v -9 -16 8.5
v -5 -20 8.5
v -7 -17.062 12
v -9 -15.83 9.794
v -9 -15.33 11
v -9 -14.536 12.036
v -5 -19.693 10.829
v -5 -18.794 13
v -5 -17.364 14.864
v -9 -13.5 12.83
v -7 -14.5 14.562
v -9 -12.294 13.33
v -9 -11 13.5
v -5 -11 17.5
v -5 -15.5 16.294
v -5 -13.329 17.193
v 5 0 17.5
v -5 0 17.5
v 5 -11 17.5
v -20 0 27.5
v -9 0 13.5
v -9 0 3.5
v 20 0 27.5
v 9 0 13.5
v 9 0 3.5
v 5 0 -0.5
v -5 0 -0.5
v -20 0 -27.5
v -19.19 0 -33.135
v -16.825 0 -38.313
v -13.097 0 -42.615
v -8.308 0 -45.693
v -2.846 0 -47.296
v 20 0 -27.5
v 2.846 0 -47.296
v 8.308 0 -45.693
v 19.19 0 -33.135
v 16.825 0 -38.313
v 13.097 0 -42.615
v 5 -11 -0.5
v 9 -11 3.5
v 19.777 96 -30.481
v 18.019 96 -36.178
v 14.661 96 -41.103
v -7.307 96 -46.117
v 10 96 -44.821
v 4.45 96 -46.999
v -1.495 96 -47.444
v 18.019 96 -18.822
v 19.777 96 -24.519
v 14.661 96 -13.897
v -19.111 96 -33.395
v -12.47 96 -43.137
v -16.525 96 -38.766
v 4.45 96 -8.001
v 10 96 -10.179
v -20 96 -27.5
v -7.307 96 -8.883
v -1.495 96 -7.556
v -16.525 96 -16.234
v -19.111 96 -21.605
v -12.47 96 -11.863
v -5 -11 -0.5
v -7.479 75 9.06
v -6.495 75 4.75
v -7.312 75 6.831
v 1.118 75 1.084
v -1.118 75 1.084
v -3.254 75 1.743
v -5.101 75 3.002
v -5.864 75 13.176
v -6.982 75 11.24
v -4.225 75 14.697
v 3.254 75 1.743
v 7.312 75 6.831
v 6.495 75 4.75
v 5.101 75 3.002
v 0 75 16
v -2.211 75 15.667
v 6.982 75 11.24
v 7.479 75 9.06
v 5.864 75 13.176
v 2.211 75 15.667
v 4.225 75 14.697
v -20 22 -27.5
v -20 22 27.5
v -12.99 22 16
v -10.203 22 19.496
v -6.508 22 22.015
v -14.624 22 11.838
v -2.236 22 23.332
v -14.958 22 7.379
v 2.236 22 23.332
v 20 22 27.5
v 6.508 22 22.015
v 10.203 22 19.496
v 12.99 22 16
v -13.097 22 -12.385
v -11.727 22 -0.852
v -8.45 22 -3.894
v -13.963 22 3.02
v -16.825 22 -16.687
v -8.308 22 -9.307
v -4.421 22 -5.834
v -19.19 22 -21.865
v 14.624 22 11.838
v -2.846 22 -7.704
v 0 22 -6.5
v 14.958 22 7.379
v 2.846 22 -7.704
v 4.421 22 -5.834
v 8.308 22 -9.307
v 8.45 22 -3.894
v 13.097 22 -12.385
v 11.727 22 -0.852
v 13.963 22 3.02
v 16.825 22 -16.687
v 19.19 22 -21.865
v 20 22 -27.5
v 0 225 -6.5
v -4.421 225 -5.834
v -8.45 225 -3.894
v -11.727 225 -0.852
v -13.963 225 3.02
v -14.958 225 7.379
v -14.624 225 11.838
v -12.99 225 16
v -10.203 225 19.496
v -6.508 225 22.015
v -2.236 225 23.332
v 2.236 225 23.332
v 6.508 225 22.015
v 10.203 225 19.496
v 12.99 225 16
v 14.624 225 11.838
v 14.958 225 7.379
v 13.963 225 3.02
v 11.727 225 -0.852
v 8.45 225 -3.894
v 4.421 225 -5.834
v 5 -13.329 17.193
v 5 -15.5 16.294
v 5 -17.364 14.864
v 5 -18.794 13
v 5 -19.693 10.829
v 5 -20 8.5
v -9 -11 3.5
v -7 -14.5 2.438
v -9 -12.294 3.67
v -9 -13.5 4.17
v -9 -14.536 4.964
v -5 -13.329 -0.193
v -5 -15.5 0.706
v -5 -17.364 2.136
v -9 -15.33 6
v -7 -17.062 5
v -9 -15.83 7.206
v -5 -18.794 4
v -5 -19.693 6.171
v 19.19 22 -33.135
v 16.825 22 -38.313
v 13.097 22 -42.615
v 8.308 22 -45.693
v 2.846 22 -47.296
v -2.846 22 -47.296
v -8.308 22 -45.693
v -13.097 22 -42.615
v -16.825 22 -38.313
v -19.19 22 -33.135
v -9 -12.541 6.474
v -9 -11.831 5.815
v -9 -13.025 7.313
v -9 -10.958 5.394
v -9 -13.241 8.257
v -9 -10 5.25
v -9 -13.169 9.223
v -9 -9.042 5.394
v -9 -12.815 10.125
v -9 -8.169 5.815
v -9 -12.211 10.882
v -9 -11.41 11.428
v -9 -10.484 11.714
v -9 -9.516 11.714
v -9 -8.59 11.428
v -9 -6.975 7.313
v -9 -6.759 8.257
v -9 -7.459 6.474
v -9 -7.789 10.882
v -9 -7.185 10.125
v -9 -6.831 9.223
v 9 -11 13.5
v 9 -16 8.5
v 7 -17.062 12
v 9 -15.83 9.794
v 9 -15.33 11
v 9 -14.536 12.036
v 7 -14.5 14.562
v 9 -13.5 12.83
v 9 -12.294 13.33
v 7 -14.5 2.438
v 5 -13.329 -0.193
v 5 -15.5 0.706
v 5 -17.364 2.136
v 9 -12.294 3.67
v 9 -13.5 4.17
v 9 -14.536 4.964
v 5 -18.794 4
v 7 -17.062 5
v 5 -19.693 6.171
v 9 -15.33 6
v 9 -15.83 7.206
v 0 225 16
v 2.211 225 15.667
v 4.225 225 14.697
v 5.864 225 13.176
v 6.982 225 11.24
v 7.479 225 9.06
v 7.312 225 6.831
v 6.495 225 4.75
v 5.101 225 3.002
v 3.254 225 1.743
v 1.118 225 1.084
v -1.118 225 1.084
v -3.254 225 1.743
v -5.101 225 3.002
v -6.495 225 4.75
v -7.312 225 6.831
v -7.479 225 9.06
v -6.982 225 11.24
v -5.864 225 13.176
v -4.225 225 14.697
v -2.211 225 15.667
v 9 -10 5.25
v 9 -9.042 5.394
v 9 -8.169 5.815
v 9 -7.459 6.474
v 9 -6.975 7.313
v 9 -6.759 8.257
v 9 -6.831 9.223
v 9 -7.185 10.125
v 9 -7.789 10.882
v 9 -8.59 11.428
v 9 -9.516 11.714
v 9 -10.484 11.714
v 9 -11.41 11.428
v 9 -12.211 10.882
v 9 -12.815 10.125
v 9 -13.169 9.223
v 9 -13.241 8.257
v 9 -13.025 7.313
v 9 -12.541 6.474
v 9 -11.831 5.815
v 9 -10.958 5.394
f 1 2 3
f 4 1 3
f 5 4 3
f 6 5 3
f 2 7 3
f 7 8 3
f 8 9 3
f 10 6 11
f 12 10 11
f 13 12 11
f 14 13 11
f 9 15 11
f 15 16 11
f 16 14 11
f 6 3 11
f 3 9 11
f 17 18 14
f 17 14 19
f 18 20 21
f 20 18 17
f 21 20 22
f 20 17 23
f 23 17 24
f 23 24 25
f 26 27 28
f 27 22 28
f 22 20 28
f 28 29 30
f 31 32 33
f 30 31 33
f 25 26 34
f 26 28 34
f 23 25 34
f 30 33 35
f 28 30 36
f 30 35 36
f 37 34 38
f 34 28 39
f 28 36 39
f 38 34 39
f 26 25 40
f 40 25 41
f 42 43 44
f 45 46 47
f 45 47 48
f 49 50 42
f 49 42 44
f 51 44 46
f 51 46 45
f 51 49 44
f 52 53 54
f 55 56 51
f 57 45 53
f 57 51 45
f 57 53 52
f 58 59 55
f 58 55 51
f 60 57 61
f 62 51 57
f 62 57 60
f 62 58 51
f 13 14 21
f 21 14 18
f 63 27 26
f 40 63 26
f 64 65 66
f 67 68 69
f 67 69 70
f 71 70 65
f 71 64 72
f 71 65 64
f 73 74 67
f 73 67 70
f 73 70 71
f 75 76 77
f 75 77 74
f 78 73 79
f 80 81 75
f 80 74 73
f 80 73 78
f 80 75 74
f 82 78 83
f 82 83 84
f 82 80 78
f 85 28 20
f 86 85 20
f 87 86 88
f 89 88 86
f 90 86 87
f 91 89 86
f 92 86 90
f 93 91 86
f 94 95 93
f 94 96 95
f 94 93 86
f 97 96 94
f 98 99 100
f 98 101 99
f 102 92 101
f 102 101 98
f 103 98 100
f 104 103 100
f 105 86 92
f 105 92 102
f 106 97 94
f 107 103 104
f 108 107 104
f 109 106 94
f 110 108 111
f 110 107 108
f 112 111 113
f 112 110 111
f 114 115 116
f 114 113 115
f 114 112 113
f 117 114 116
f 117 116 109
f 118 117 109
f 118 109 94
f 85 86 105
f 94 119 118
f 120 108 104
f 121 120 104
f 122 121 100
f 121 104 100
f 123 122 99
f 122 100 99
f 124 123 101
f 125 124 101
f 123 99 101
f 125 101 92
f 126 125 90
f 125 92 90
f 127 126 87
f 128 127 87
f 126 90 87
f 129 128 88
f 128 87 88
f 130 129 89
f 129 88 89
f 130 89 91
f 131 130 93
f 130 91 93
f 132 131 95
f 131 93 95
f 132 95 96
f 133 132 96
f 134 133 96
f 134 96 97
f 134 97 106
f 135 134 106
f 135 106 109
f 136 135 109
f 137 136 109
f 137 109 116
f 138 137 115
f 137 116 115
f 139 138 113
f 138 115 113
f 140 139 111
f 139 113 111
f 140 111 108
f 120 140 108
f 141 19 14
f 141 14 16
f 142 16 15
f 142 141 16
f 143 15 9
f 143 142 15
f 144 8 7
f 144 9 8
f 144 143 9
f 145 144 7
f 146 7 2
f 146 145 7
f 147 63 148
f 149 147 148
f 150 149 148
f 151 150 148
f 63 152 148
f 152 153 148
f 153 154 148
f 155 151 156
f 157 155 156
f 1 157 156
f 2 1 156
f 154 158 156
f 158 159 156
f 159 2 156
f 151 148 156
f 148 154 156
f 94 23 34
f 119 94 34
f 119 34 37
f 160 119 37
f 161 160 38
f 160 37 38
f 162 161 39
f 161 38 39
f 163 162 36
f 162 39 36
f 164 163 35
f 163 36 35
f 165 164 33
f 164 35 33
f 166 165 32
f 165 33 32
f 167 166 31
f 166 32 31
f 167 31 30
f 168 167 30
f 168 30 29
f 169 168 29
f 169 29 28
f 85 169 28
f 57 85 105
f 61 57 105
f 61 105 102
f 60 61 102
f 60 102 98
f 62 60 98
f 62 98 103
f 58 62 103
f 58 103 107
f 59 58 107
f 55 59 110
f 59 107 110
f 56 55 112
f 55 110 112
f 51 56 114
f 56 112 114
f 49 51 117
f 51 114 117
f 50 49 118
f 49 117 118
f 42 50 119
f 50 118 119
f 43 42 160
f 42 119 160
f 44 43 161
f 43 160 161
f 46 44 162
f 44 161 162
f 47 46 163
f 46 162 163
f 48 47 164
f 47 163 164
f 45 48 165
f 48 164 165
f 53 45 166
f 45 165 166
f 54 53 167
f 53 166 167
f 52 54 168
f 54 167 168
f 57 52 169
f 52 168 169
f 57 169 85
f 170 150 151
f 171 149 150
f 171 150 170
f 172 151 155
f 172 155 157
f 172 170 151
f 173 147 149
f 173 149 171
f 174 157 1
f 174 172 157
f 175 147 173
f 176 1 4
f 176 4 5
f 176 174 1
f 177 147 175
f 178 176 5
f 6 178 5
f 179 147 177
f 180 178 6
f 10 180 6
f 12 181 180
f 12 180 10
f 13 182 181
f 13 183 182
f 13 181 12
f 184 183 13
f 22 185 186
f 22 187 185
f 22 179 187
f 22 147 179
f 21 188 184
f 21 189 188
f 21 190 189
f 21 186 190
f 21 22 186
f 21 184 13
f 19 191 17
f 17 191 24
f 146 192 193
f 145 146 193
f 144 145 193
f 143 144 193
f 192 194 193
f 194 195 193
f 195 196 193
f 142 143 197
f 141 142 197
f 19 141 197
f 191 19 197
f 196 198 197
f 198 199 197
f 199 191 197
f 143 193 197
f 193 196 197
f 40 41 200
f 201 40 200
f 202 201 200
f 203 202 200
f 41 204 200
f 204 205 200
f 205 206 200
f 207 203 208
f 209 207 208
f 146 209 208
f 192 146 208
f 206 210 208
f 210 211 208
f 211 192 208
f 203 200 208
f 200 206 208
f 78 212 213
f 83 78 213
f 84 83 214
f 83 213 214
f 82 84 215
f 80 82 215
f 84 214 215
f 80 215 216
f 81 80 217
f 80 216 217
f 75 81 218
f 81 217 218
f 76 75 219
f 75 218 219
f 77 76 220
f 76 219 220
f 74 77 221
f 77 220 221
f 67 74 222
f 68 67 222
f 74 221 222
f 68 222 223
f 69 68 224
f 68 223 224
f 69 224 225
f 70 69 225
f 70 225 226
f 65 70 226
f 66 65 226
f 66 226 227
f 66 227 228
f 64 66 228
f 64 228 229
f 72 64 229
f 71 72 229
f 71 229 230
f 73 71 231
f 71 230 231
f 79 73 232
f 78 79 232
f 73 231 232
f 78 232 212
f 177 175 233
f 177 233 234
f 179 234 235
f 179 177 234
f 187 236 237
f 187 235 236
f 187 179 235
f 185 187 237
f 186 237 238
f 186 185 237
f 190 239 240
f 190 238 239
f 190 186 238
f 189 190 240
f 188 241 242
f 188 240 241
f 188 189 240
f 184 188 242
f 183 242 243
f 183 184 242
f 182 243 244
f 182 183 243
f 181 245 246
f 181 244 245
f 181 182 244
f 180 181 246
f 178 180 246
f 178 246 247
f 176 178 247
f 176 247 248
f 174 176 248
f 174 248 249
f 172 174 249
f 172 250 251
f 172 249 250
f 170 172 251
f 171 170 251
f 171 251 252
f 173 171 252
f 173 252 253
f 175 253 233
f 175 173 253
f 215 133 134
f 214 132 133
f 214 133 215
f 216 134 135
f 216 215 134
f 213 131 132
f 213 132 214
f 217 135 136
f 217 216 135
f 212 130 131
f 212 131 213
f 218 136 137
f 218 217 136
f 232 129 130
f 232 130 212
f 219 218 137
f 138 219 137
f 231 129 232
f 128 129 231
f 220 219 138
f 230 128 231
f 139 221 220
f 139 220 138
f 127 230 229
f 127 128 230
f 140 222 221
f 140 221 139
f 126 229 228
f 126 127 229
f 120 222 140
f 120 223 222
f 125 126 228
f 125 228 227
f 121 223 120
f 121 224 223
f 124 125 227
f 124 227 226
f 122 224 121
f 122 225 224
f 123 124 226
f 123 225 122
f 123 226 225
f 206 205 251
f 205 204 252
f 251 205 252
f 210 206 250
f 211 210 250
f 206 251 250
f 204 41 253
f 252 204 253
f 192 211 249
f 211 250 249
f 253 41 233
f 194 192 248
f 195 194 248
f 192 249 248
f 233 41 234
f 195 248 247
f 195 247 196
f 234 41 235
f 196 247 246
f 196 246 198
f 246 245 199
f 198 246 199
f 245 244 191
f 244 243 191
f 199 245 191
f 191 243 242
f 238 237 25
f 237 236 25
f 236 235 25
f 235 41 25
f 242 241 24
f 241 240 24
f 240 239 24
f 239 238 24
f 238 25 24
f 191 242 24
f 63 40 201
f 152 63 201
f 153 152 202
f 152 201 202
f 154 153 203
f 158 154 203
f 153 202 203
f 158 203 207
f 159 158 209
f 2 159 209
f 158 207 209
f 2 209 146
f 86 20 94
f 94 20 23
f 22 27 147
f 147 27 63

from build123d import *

# Parameters (mm, degrees)
EXTRUDE_1_DEPTH          = 22
SKETCH_2_R               = 20
EXTRUDE_2_DEPTH          = 74
SKETCH_3_R               = 15
EXTRUDE_3_DEPTH          = 203
SKETCH_4_R               = 7.5
CUT_EXTRUDE_1_DEPTH      = 150
SKETCH_5_W               = 18
SKETCH_5_H               = 18
EXTRUDE_4_DEPTH          = 20
CUT_EXTRUDE_2_DEPTH      = 232.780607472
CUT_EXTRUDE_2_DEPTH_BACK = 232.780607472
CUT_EXTRUDE_3_DEPTH      = 232.780607472
CUT_EXTRUDE_3_DEPTH_BACK = 232.780607472
CHAMFER_1_SIZE           = 4
CHAMFER_2_SIZE           = 4
CUT_EXTRUDE_4_DEPTH      = 232.780607472
CUT_EXTRUDE_4_DEPTH_BACK = 232.780607472
SKETCH_8_R               = 3.25


with BuildPart() as part:
    # 草图1 → 凸台-拉伸1 (new body)
    with BuildSketch(Plane(origin=(0, 0, 0), x_dir=(1, 0, 0), z_dir=(0, 1, 0))):
        with BuildLine():
            Line((-20, -27.5), (20, -27.5))
            Line((20, -27.5), (20, 27.5))
            ThreePointArc((20, 27.5), (0, 47.5), (-20, 27.5))
            Line((-20, 27.5), (-20, -27.5))
        make_face()
    extrude(amount=EXTRUDE_1_DEPTH)

    # 草图2 → 凸台-拉伸2 (add)
    with BuildSketch(Plane(origin=(0, 22, 0), x_dir=(1, 0, 0), z_dir=(0, 1, 0))):
        with Locations(Location((0, 27.5, 0), (0, 0, 180))):
            Circle(SKETCH_2_R)
    extrude(amount=EXTRUDE_2_DEPTH)

    # 草图3 → 凸台-拉伸3 (add)
    with BuildSketch(Plane(origin=(0, 22, 0), x_dir=(1, 0, 0), z_dir=(0, 1, 0))):
        with Locations(Location((0, -8.5, 0), (0, 0, 90))):
            Circle(SKETCH_3_R)
    extrude(amount=EXTRUDE_3_DEPTH)

    # 草图4 → 切除-拉伸1 (cut)
    with BuildSketch(Plane(origin=(0, 225, 0), x_dir=(1, 0, 0), z_dir=(0, 1, 0))):
        with Locations(Location((0, -8.5, 0), (0, 0, 270))):
            Circle(SKETCH_4_R)
    extrude(amount=-CUT_EXTRUDE_1_DEPTH, mode=Mode.SUBTRACT)

    # 草图5 → 凸台-拉伸4 (add)
    with BuildSketch(Plane.XZ):
        with Locations((0, 8.5)):
            Rectangle(SKETCH_5_W, SKETCH_5_H)
    extrude(amount=EXTRUDE_4_DEPTH)

    # 草图6 → 切除-拉伸2 (cut, two sides: drawn at the far end of the back side and taken through both)
    with BuildSketch(Plane.ZY.offset(9).offset(-CUT_EXTRUDE_2_DEPTH_BACK)):
        with BuildLine():
            Line((8.5, -20), (-0.5, -20))
            Line((-0.5, -20), (-0.5, -11))
            ThreePointArc((-0.5, -11), (2.136038969, -17.363961031), (8.5, -20))
        make_face()
    extrude(amount=CUT_EXTRUDE_2_DEPTH + CUT_EXTRUDE_2_DEPTH_BACK, mode=Mode.SUBTRACT)

    # 草图7 → 切除-拉伸3 (cut, two sides: drawn at the far end of the back side and taken through both)
    with BuildSketch(Plane.ZY.offset(9).offset(-CUT_EXTRUDE_3_DEPTH_BACK)):
        with BuildLine():
            Line((8.5, -20), (17.5, -20))
            Line((17.5, -20), (17.5, -11))
            ThreePointArc((17.5, -11), (14.863961031, -17.363961031), (8.5, -20))
        make_face()
    extrude(amount=CUT_EXTRUDE_3_DEPTH + CUT_EXTRUDE_3_DEPTH_BACK, mode=Mode.SUBTRACT)

    # 倒角1
    chamfer_1_edges = [part.edges().sort_by_distance(p)[0] for p in [
        (-9, -5.5, -0.5),
        (-9, -20, 8.5),
        (-9, -5.5, 17.5),
    ]]
    chamfer(chamfer_1_edges, length=CHAMFER_1_SIZE)

    # 倒角2
    chamfer_2_edges = [part.edges().sort_by_distance(p)[0] for p in [
        (9, -5.5, -0.5),
        (9, -20, 8.5),
        (9, -5.5, 17.5),
    ]]
    chamfer(chamfer_2_edges, length=CHAMFER_2_SIZE)

    # 草图8 → 切除-拉伸4 (cut, two sides: drawn at the far end of the back side and taken through both)
    with BuildSketch(Plane(origin=(9, 0, 0), x_dir=(0, 0, -1), z_dir=(1, 0, 0)).offset(-CUT_EXTRUDE_4_DEPTH_BACK)):
        with Locations((-8.5, -10)):
            Circle(SKETCH_8_R)
    extrude(amount=CUT_EXTRUDE_4_DEPTH + CUT_EXTRUDE_4_DEPTH_BACK, mode=Mode.SUBTRACT)


solid = part.part
